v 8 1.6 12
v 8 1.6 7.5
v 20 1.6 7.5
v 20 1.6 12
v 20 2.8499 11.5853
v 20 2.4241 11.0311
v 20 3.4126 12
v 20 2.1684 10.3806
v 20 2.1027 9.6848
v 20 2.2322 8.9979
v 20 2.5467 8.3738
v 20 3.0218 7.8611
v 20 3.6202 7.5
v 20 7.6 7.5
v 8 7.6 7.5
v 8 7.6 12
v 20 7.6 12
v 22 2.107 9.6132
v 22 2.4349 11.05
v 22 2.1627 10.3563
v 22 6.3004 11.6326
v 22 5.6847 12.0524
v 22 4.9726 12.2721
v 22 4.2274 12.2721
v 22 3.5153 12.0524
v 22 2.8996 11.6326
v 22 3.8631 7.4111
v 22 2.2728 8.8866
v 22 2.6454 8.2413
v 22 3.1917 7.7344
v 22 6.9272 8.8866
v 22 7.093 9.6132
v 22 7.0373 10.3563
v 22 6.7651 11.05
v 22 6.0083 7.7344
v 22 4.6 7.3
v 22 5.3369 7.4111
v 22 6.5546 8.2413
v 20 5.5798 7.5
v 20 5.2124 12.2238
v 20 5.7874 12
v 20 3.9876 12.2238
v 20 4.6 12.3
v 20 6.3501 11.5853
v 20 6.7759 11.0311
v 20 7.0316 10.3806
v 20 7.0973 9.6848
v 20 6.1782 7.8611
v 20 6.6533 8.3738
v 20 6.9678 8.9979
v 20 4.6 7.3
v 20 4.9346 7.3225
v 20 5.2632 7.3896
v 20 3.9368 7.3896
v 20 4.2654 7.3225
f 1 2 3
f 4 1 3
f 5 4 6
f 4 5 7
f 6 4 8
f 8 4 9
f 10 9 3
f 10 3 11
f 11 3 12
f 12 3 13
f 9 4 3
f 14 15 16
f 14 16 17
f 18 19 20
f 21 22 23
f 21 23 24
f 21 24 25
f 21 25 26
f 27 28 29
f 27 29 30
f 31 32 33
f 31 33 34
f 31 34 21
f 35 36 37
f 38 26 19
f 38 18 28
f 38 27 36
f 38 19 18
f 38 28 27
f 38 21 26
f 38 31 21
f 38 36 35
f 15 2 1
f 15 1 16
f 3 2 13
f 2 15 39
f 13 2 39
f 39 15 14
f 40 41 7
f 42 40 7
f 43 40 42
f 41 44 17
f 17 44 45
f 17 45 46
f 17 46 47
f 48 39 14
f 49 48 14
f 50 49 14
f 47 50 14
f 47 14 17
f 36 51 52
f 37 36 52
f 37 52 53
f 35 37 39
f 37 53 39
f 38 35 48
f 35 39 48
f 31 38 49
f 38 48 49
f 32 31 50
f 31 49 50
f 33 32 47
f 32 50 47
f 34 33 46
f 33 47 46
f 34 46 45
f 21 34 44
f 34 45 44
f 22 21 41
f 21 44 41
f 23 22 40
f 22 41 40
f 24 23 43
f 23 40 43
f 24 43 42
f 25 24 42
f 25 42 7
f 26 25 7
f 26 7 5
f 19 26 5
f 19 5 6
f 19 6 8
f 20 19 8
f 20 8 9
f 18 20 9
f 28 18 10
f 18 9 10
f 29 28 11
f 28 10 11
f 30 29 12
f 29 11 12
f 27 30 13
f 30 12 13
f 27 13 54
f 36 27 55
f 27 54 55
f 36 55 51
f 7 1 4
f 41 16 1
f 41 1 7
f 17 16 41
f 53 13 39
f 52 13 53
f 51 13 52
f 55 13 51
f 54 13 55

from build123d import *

# Parameters (mm, degrees)
BOX018_W                = 12
BOX018_H                = 6
BOX018_DEPTH            = 4.5
CYLINDER020_R           = 2.5
CYLINDER020_DEPTH       = 2
CYLINDER020_PITCH_ANGLE = 90


with BuildPart() as aj_body001:
    # Box018 → Box018 (new body)
    with BuildSketch(Plane.XY.offset(18)):
        with Locations((6, 3)):
            Rectangle(BOX018_W, BOX018_H)
    extrude(amount=BOX018_DEPTH)


with BuildPart() as audio_jack001:
    # Cylinder020 → Cylinder020 (new body)
    with BuildSketch(Plane.XY):
        Circle(CYLINDER020_R)
    extrude(amount=CYLINDER020_DEPTH)


with BuildPart() as audio_jack001_1:
    # Cylinder020 pitch: moved
    add(audio_jack001.part.rotate(Axis((0, 0, 0), (0, 1, 0)), CYLINDER020_PITCH_ANGLE))


with BuildPart() as audio_jack001_2:
    # Cylinder020 placement: moved
    add(audio_jack001_1.part.moved(Location((12, 3, 20.3))))

    # Fusion011: union AJ_body001
    add(aj_body001.part)


with BuildPart() as audio_jack001_3:
    # Fusion011 placement: moved
    add(audio_jack001_2.part.moved(Location((8, 1.6, -10.5))))


solid = audio_jack001_3.part
